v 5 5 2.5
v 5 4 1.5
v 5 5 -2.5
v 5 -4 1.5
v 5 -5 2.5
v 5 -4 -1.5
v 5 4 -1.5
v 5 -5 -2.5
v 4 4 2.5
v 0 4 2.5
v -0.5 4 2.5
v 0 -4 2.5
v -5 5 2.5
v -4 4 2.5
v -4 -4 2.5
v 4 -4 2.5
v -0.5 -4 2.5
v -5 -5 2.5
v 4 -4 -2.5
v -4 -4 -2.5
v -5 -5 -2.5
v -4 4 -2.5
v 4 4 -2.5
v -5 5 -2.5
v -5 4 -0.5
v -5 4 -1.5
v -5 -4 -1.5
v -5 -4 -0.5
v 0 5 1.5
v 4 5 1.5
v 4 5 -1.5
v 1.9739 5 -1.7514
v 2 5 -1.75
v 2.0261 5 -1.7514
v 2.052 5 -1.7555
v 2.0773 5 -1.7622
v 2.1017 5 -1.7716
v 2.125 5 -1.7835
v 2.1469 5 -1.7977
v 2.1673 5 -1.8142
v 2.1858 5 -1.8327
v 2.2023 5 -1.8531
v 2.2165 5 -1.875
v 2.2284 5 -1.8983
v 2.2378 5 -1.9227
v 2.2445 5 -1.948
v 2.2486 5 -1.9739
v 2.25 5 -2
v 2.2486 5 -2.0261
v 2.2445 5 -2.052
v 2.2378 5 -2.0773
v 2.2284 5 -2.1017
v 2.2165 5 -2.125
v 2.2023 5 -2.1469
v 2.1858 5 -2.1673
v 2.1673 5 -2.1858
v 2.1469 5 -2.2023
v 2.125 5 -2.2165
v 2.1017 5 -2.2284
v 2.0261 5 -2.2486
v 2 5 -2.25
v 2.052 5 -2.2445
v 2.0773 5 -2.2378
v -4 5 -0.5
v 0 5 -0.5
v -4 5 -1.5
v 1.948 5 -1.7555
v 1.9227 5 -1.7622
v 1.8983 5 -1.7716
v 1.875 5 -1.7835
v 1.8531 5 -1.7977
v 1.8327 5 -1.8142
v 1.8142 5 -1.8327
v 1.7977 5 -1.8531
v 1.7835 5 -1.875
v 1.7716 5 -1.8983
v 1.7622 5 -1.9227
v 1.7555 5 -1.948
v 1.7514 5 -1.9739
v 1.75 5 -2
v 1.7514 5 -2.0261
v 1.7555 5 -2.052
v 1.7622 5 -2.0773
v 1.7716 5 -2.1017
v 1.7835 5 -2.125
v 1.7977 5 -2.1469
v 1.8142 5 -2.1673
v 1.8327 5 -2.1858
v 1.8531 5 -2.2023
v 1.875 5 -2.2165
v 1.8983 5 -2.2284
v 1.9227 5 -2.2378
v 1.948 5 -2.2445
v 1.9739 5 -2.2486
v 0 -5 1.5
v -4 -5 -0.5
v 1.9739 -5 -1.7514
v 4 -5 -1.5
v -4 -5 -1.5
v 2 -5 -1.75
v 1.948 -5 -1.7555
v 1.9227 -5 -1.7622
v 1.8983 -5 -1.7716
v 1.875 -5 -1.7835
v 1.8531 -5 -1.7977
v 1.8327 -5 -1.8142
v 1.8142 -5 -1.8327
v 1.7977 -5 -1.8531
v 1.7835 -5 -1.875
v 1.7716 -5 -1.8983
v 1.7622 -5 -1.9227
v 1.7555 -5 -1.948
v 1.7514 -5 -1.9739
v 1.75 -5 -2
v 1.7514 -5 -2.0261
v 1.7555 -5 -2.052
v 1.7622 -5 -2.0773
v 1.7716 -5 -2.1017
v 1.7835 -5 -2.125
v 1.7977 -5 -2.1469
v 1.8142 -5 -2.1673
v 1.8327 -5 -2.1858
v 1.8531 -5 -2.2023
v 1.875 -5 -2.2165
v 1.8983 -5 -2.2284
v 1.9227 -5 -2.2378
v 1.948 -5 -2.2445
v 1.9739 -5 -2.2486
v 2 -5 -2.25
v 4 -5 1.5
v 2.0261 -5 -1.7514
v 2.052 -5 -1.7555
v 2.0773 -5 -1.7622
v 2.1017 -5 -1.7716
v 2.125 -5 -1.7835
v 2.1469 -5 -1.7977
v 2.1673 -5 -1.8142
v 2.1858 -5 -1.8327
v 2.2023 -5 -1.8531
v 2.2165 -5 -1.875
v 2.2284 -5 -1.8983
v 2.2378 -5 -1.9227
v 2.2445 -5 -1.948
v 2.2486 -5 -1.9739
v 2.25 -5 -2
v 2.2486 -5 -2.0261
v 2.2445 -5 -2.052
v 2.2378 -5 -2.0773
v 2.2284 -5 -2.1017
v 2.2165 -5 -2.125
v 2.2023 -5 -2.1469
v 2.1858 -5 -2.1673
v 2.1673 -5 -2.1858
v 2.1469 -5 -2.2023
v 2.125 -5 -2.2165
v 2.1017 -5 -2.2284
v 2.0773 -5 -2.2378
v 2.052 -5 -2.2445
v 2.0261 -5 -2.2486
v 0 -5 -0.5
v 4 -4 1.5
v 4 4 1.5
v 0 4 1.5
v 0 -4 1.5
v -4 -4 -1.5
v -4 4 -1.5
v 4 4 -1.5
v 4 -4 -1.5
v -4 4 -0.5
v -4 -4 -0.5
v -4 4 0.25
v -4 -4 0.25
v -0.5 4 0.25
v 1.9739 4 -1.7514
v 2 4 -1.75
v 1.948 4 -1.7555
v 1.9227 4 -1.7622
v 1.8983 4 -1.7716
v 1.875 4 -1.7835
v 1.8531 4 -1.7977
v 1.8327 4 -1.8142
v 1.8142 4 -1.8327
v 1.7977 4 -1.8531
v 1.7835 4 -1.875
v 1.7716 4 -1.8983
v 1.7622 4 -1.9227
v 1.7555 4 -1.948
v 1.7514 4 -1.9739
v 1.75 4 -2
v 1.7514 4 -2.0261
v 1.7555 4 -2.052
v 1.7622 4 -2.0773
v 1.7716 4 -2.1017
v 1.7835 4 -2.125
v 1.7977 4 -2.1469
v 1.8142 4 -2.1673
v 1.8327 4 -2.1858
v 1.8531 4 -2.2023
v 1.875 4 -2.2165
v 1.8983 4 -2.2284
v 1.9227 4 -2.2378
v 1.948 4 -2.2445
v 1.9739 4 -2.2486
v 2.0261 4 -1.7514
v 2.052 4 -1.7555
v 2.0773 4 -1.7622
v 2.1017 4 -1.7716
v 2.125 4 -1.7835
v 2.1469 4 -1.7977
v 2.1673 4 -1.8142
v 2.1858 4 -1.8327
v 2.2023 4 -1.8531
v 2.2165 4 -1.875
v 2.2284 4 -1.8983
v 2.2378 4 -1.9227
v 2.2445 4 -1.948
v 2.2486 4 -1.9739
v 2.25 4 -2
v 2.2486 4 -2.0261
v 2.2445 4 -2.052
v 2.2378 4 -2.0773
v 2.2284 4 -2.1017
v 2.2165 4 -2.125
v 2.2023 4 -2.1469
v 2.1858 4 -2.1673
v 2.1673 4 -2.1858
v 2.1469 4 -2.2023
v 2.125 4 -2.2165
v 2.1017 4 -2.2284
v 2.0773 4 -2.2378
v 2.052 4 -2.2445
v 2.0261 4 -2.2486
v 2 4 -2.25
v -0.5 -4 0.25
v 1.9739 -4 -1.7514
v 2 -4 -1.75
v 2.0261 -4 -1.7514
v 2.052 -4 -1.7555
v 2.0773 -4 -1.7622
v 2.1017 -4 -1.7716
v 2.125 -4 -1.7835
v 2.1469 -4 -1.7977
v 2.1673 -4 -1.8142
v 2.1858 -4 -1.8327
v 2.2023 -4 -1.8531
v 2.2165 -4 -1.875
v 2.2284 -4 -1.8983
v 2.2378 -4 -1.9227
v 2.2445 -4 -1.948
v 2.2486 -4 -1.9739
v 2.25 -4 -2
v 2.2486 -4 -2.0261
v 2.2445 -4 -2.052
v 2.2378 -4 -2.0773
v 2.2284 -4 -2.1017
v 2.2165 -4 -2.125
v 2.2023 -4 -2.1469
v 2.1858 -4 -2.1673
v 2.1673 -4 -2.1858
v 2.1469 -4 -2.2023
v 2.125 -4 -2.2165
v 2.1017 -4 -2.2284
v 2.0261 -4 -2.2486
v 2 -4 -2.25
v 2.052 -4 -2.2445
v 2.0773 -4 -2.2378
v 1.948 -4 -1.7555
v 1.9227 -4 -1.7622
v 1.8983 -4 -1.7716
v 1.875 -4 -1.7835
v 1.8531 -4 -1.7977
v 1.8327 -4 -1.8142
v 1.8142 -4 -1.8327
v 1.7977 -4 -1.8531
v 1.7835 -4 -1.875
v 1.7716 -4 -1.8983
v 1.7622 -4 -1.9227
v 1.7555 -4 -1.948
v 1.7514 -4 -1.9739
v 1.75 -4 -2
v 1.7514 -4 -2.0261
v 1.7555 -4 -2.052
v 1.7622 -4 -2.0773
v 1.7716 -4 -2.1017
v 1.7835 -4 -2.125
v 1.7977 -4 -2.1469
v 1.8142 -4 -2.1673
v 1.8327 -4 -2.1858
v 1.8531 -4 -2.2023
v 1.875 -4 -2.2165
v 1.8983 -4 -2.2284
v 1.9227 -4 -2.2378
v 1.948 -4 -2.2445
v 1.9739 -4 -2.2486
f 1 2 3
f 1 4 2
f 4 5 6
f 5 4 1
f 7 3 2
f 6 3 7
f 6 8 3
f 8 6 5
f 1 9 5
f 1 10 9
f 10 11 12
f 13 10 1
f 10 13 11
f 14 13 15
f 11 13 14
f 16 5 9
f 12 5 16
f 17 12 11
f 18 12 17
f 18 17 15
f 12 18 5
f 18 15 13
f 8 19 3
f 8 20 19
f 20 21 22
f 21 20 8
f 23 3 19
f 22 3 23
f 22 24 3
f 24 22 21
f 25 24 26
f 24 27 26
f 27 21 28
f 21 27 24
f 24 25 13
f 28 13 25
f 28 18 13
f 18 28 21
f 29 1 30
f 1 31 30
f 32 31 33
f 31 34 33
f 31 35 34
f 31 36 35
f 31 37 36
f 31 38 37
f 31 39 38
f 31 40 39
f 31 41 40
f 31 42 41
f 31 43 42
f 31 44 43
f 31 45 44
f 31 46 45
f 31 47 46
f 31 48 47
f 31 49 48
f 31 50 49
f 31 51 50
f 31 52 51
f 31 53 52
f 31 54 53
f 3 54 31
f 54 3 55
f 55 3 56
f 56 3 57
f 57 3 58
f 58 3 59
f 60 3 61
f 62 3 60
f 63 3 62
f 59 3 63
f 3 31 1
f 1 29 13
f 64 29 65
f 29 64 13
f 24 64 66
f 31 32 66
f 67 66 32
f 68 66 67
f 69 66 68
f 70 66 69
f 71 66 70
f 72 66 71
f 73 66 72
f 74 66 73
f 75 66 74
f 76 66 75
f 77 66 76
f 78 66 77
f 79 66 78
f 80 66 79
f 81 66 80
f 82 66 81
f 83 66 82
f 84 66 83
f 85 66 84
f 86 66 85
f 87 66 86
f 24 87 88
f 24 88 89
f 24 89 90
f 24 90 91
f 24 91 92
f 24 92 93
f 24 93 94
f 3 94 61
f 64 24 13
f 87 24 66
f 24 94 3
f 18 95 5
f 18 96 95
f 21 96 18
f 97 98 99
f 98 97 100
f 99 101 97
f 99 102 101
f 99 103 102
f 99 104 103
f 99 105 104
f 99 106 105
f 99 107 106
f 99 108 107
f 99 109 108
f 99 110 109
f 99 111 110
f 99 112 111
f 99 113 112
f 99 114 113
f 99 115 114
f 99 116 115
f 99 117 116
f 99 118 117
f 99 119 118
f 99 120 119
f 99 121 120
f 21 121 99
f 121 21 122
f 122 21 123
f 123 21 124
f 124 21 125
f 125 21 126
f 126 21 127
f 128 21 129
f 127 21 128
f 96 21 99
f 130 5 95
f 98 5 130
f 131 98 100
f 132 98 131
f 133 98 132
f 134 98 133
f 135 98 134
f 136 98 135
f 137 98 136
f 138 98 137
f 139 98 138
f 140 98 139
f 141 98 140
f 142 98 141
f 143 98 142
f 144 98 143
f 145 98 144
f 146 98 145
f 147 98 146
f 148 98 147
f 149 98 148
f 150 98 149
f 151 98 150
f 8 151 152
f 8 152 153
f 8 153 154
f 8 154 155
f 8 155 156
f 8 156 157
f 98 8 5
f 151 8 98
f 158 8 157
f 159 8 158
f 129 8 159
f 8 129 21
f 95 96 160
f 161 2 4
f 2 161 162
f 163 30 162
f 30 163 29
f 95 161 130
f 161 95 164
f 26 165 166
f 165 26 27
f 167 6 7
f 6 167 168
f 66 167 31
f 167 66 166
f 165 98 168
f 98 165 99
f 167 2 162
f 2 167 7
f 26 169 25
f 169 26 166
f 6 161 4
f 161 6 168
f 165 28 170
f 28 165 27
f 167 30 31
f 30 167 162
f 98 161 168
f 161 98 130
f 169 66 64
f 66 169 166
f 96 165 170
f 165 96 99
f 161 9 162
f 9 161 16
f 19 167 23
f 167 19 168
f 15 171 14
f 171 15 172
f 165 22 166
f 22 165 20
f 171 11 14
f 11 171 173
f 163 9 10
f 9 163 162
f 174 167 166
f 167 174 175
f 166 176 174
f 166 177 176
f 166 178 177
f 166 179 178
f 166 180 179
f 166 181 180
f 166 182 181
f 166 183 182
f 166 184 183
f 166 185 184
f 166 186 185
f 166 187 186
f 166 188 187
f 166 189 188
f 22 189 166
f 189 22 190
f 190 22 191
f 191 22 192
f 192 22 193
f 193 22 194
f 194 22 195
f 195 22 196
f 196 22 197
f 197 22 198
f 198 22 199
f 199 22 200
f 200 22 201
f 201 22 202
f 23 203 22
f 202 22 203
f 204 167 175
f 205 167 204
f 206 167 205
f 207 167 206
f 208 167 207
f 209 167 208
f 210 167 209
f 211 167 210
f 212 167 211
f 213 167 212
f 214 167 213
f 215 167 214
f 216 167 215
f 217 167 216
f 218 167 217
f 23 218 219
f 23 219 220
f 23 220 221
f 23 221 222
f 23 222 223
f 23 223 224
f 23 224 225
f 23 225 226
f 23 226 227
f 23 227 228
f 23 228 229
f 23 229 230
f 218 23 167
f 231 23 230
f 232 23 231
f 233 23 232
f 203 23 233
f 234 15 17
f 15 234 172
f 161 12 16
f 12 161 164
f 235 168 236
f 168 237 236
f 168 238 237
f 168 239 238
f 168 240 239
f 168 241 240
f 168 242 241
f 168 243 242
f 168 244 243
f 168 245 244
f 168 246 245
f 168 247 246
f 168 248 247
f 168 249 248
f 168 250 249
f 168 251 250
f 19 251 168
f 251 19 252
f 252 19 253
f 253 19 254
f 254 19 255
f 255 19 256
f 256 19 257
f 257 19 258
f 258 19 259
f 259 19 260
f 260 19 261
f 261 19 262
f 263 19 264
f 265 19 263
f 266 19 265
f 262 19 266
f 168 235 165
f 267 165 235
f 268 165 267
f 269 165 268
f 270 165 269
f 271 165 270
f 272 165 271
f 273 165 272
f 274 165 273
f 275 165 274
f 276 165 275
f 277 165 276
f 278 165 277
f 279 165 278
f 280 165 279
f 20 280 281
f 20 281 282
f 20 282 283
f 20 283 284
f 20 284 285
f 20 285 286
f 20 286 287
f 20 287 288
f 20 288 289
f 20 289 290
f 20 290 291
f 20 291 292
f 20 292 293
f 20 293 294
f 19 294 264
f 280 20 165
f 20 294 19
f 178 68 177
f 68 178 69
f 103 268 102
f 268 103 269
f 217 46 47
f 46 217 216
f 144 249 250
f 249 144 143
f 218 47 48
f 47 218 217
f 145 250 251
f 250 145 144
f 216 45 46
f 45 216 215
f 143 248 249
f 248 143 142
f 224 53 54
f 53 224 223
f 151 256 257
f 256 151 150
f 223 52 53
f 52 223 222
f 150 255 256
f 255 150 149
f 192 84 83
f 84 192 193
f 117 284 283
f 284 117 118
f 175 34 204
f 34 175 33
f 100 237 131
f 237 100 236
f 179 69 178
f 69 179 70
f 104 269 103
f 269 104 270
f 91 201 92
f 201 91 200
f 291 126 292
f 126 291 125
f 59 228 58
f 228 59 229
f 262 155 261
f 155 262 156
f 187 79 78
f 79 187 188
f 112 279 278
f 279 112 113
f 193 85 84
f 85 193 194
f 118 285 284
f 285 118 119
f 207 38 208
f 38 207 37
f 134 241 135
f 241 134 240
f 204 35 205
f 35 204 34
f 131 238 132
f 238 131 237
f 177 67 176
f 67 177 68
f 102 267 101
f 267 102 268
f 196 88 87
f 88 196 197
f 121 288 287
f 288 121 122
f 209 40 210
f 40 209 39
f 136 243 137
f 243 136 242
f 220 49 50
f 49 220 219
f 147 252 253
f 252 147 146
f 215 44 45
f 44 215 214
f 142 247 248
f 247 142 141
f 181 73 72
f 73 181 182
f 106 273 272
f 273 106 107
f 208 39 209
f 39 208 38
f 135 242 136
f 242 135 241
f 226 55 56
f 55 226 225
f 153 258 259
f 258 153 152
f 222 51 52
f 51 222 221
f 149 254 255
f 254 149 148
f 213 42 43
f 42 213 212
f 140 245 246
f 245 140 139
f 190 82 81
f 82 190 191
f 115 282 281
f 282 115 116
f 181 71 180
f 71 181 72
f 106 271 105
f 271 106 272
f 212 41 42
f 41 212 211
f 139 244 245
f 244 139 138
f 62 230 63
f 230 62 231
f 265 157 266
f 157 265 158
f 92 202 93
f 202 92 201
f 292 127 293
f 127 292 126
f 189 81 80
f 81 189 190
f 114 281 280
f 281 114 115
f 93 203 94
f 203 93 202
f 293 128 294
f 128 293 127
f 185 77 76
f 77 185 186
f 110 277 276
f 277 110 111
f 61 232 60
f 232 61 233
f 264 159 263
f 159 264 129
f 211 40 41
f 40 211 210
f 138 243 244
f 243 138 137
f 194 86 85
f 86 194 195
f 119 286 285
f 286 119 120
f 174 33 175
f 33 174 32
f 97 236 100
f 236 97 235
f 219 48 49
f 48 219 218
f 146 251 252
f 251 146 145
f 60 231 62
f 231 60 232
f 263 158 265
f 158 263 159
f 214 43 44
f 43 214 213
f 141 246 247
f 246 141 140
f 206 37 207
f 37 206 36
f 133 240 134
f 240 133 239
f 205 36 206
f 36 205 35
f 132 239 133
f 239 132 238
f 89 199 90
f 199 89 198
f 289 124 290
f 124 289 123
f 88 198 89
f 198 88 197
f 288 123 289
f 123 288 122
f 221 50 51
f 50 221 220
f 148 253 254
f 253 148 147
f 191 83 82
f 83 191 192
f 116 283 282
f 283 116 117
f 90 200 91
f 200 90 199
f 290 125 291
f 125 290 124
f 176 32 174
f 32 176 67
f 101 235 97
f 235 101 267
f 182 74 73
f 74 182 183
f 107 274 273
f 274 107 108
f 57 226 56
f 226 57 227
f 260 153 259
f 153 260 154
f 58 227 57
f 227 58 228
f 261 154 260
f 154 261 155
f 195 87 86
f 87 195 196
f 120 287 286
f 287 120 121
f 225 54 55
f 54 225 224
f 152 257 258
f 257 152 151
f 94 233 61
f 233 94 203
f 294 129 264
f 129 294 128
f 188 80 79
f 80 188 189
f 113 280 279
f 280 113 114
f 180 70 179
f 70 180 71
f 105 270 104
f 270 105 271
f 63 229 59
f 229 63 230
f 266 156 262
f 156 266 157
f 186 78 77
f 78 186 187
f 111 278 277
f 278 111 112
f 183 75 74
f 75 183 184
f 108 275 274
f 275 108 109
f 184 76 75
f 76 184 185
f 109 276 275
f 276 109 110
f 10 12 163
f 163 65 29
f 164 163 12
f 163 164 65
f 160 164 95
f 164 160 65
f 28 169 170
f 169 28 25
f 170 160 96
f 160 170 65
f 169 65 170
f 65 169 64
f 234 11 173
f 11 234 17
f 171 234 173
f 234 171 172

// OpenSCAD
chassis_length = 10;
chassis_width = 10;
chassis_height = 5;
//define chassis variable
chassis_dim = [chassis_length, chassis_width, chassis_height
];
frame_width = 1;
axle_position = 3;
axle_diameter = 0.5;
shelf_height = 2;
clearance = 0.2;
$fn = 60;

union(){
    difference() {
        //outer structure
        cube(chassis_dim, center = true);
        
        
        
        //cutout on x axis
        cube([
            chassis_dim[0] + clearance,
            chassis_dim[1] - (2 * frame_width),
            chassis_dim[2] - (2 * frame_width)
        ], center = true);
        
        
        
        //cutout on y axis
        cube([
            chassis_dim[0] - (2 * frame_width),
            chassis_dim[1] + clearance,
            chassis_dim[2] - (2 * frame_width)
        ], center = true);
        
        
        
        //cutout on z axis
        cube([
            chassis_dim[0] - (2 * frame_width),
            chassis_dim[1] - (2 * frame_width),
            chassis_dim[2] + clearance
        ], center = true);
        
        //move cylindar
        translate([
            (chassis_dim[0] / 2) - axle_position, 
            0,
            ((frame_width / 2) - (chassis_dim[2] / 2))
            ]){
                
                //rotate cylinder
            rotate([90, 0, 0]) {
            
                //create cylinder for axle
                cylinder(h = chassis_dim[0] + clearance, r = (axle_diameter/2), center = true);
            
            }
        }
    }
    
    
    translate([
    -chassis_dim[0] / 4,
    0,
    (chassis_dim[2] / 2) - ((chassis_dim[2] - shelf_height) / 2)
    ]){
        
        difference(){
            
            //create outer
            cube([
            chassis_dim[0] / 2,
            chassis_dim[1],
            (chassis_dim[2] - shelf_height)
        ], center = true);
            
            
            //move cut out
            translate([
            
                frame_width / 4,
                0,
                0.75
            
            ]){
                //create cut out
                cube([
                    ((chassis_dim[0] / 2) - frame_width) - 0.5,
                    chassis_dim[1] - (2 * frame_width),
                    chassis_dim[2] - shelf_height
                ], center = true);
            }
        }
        
    }
    
}
    
